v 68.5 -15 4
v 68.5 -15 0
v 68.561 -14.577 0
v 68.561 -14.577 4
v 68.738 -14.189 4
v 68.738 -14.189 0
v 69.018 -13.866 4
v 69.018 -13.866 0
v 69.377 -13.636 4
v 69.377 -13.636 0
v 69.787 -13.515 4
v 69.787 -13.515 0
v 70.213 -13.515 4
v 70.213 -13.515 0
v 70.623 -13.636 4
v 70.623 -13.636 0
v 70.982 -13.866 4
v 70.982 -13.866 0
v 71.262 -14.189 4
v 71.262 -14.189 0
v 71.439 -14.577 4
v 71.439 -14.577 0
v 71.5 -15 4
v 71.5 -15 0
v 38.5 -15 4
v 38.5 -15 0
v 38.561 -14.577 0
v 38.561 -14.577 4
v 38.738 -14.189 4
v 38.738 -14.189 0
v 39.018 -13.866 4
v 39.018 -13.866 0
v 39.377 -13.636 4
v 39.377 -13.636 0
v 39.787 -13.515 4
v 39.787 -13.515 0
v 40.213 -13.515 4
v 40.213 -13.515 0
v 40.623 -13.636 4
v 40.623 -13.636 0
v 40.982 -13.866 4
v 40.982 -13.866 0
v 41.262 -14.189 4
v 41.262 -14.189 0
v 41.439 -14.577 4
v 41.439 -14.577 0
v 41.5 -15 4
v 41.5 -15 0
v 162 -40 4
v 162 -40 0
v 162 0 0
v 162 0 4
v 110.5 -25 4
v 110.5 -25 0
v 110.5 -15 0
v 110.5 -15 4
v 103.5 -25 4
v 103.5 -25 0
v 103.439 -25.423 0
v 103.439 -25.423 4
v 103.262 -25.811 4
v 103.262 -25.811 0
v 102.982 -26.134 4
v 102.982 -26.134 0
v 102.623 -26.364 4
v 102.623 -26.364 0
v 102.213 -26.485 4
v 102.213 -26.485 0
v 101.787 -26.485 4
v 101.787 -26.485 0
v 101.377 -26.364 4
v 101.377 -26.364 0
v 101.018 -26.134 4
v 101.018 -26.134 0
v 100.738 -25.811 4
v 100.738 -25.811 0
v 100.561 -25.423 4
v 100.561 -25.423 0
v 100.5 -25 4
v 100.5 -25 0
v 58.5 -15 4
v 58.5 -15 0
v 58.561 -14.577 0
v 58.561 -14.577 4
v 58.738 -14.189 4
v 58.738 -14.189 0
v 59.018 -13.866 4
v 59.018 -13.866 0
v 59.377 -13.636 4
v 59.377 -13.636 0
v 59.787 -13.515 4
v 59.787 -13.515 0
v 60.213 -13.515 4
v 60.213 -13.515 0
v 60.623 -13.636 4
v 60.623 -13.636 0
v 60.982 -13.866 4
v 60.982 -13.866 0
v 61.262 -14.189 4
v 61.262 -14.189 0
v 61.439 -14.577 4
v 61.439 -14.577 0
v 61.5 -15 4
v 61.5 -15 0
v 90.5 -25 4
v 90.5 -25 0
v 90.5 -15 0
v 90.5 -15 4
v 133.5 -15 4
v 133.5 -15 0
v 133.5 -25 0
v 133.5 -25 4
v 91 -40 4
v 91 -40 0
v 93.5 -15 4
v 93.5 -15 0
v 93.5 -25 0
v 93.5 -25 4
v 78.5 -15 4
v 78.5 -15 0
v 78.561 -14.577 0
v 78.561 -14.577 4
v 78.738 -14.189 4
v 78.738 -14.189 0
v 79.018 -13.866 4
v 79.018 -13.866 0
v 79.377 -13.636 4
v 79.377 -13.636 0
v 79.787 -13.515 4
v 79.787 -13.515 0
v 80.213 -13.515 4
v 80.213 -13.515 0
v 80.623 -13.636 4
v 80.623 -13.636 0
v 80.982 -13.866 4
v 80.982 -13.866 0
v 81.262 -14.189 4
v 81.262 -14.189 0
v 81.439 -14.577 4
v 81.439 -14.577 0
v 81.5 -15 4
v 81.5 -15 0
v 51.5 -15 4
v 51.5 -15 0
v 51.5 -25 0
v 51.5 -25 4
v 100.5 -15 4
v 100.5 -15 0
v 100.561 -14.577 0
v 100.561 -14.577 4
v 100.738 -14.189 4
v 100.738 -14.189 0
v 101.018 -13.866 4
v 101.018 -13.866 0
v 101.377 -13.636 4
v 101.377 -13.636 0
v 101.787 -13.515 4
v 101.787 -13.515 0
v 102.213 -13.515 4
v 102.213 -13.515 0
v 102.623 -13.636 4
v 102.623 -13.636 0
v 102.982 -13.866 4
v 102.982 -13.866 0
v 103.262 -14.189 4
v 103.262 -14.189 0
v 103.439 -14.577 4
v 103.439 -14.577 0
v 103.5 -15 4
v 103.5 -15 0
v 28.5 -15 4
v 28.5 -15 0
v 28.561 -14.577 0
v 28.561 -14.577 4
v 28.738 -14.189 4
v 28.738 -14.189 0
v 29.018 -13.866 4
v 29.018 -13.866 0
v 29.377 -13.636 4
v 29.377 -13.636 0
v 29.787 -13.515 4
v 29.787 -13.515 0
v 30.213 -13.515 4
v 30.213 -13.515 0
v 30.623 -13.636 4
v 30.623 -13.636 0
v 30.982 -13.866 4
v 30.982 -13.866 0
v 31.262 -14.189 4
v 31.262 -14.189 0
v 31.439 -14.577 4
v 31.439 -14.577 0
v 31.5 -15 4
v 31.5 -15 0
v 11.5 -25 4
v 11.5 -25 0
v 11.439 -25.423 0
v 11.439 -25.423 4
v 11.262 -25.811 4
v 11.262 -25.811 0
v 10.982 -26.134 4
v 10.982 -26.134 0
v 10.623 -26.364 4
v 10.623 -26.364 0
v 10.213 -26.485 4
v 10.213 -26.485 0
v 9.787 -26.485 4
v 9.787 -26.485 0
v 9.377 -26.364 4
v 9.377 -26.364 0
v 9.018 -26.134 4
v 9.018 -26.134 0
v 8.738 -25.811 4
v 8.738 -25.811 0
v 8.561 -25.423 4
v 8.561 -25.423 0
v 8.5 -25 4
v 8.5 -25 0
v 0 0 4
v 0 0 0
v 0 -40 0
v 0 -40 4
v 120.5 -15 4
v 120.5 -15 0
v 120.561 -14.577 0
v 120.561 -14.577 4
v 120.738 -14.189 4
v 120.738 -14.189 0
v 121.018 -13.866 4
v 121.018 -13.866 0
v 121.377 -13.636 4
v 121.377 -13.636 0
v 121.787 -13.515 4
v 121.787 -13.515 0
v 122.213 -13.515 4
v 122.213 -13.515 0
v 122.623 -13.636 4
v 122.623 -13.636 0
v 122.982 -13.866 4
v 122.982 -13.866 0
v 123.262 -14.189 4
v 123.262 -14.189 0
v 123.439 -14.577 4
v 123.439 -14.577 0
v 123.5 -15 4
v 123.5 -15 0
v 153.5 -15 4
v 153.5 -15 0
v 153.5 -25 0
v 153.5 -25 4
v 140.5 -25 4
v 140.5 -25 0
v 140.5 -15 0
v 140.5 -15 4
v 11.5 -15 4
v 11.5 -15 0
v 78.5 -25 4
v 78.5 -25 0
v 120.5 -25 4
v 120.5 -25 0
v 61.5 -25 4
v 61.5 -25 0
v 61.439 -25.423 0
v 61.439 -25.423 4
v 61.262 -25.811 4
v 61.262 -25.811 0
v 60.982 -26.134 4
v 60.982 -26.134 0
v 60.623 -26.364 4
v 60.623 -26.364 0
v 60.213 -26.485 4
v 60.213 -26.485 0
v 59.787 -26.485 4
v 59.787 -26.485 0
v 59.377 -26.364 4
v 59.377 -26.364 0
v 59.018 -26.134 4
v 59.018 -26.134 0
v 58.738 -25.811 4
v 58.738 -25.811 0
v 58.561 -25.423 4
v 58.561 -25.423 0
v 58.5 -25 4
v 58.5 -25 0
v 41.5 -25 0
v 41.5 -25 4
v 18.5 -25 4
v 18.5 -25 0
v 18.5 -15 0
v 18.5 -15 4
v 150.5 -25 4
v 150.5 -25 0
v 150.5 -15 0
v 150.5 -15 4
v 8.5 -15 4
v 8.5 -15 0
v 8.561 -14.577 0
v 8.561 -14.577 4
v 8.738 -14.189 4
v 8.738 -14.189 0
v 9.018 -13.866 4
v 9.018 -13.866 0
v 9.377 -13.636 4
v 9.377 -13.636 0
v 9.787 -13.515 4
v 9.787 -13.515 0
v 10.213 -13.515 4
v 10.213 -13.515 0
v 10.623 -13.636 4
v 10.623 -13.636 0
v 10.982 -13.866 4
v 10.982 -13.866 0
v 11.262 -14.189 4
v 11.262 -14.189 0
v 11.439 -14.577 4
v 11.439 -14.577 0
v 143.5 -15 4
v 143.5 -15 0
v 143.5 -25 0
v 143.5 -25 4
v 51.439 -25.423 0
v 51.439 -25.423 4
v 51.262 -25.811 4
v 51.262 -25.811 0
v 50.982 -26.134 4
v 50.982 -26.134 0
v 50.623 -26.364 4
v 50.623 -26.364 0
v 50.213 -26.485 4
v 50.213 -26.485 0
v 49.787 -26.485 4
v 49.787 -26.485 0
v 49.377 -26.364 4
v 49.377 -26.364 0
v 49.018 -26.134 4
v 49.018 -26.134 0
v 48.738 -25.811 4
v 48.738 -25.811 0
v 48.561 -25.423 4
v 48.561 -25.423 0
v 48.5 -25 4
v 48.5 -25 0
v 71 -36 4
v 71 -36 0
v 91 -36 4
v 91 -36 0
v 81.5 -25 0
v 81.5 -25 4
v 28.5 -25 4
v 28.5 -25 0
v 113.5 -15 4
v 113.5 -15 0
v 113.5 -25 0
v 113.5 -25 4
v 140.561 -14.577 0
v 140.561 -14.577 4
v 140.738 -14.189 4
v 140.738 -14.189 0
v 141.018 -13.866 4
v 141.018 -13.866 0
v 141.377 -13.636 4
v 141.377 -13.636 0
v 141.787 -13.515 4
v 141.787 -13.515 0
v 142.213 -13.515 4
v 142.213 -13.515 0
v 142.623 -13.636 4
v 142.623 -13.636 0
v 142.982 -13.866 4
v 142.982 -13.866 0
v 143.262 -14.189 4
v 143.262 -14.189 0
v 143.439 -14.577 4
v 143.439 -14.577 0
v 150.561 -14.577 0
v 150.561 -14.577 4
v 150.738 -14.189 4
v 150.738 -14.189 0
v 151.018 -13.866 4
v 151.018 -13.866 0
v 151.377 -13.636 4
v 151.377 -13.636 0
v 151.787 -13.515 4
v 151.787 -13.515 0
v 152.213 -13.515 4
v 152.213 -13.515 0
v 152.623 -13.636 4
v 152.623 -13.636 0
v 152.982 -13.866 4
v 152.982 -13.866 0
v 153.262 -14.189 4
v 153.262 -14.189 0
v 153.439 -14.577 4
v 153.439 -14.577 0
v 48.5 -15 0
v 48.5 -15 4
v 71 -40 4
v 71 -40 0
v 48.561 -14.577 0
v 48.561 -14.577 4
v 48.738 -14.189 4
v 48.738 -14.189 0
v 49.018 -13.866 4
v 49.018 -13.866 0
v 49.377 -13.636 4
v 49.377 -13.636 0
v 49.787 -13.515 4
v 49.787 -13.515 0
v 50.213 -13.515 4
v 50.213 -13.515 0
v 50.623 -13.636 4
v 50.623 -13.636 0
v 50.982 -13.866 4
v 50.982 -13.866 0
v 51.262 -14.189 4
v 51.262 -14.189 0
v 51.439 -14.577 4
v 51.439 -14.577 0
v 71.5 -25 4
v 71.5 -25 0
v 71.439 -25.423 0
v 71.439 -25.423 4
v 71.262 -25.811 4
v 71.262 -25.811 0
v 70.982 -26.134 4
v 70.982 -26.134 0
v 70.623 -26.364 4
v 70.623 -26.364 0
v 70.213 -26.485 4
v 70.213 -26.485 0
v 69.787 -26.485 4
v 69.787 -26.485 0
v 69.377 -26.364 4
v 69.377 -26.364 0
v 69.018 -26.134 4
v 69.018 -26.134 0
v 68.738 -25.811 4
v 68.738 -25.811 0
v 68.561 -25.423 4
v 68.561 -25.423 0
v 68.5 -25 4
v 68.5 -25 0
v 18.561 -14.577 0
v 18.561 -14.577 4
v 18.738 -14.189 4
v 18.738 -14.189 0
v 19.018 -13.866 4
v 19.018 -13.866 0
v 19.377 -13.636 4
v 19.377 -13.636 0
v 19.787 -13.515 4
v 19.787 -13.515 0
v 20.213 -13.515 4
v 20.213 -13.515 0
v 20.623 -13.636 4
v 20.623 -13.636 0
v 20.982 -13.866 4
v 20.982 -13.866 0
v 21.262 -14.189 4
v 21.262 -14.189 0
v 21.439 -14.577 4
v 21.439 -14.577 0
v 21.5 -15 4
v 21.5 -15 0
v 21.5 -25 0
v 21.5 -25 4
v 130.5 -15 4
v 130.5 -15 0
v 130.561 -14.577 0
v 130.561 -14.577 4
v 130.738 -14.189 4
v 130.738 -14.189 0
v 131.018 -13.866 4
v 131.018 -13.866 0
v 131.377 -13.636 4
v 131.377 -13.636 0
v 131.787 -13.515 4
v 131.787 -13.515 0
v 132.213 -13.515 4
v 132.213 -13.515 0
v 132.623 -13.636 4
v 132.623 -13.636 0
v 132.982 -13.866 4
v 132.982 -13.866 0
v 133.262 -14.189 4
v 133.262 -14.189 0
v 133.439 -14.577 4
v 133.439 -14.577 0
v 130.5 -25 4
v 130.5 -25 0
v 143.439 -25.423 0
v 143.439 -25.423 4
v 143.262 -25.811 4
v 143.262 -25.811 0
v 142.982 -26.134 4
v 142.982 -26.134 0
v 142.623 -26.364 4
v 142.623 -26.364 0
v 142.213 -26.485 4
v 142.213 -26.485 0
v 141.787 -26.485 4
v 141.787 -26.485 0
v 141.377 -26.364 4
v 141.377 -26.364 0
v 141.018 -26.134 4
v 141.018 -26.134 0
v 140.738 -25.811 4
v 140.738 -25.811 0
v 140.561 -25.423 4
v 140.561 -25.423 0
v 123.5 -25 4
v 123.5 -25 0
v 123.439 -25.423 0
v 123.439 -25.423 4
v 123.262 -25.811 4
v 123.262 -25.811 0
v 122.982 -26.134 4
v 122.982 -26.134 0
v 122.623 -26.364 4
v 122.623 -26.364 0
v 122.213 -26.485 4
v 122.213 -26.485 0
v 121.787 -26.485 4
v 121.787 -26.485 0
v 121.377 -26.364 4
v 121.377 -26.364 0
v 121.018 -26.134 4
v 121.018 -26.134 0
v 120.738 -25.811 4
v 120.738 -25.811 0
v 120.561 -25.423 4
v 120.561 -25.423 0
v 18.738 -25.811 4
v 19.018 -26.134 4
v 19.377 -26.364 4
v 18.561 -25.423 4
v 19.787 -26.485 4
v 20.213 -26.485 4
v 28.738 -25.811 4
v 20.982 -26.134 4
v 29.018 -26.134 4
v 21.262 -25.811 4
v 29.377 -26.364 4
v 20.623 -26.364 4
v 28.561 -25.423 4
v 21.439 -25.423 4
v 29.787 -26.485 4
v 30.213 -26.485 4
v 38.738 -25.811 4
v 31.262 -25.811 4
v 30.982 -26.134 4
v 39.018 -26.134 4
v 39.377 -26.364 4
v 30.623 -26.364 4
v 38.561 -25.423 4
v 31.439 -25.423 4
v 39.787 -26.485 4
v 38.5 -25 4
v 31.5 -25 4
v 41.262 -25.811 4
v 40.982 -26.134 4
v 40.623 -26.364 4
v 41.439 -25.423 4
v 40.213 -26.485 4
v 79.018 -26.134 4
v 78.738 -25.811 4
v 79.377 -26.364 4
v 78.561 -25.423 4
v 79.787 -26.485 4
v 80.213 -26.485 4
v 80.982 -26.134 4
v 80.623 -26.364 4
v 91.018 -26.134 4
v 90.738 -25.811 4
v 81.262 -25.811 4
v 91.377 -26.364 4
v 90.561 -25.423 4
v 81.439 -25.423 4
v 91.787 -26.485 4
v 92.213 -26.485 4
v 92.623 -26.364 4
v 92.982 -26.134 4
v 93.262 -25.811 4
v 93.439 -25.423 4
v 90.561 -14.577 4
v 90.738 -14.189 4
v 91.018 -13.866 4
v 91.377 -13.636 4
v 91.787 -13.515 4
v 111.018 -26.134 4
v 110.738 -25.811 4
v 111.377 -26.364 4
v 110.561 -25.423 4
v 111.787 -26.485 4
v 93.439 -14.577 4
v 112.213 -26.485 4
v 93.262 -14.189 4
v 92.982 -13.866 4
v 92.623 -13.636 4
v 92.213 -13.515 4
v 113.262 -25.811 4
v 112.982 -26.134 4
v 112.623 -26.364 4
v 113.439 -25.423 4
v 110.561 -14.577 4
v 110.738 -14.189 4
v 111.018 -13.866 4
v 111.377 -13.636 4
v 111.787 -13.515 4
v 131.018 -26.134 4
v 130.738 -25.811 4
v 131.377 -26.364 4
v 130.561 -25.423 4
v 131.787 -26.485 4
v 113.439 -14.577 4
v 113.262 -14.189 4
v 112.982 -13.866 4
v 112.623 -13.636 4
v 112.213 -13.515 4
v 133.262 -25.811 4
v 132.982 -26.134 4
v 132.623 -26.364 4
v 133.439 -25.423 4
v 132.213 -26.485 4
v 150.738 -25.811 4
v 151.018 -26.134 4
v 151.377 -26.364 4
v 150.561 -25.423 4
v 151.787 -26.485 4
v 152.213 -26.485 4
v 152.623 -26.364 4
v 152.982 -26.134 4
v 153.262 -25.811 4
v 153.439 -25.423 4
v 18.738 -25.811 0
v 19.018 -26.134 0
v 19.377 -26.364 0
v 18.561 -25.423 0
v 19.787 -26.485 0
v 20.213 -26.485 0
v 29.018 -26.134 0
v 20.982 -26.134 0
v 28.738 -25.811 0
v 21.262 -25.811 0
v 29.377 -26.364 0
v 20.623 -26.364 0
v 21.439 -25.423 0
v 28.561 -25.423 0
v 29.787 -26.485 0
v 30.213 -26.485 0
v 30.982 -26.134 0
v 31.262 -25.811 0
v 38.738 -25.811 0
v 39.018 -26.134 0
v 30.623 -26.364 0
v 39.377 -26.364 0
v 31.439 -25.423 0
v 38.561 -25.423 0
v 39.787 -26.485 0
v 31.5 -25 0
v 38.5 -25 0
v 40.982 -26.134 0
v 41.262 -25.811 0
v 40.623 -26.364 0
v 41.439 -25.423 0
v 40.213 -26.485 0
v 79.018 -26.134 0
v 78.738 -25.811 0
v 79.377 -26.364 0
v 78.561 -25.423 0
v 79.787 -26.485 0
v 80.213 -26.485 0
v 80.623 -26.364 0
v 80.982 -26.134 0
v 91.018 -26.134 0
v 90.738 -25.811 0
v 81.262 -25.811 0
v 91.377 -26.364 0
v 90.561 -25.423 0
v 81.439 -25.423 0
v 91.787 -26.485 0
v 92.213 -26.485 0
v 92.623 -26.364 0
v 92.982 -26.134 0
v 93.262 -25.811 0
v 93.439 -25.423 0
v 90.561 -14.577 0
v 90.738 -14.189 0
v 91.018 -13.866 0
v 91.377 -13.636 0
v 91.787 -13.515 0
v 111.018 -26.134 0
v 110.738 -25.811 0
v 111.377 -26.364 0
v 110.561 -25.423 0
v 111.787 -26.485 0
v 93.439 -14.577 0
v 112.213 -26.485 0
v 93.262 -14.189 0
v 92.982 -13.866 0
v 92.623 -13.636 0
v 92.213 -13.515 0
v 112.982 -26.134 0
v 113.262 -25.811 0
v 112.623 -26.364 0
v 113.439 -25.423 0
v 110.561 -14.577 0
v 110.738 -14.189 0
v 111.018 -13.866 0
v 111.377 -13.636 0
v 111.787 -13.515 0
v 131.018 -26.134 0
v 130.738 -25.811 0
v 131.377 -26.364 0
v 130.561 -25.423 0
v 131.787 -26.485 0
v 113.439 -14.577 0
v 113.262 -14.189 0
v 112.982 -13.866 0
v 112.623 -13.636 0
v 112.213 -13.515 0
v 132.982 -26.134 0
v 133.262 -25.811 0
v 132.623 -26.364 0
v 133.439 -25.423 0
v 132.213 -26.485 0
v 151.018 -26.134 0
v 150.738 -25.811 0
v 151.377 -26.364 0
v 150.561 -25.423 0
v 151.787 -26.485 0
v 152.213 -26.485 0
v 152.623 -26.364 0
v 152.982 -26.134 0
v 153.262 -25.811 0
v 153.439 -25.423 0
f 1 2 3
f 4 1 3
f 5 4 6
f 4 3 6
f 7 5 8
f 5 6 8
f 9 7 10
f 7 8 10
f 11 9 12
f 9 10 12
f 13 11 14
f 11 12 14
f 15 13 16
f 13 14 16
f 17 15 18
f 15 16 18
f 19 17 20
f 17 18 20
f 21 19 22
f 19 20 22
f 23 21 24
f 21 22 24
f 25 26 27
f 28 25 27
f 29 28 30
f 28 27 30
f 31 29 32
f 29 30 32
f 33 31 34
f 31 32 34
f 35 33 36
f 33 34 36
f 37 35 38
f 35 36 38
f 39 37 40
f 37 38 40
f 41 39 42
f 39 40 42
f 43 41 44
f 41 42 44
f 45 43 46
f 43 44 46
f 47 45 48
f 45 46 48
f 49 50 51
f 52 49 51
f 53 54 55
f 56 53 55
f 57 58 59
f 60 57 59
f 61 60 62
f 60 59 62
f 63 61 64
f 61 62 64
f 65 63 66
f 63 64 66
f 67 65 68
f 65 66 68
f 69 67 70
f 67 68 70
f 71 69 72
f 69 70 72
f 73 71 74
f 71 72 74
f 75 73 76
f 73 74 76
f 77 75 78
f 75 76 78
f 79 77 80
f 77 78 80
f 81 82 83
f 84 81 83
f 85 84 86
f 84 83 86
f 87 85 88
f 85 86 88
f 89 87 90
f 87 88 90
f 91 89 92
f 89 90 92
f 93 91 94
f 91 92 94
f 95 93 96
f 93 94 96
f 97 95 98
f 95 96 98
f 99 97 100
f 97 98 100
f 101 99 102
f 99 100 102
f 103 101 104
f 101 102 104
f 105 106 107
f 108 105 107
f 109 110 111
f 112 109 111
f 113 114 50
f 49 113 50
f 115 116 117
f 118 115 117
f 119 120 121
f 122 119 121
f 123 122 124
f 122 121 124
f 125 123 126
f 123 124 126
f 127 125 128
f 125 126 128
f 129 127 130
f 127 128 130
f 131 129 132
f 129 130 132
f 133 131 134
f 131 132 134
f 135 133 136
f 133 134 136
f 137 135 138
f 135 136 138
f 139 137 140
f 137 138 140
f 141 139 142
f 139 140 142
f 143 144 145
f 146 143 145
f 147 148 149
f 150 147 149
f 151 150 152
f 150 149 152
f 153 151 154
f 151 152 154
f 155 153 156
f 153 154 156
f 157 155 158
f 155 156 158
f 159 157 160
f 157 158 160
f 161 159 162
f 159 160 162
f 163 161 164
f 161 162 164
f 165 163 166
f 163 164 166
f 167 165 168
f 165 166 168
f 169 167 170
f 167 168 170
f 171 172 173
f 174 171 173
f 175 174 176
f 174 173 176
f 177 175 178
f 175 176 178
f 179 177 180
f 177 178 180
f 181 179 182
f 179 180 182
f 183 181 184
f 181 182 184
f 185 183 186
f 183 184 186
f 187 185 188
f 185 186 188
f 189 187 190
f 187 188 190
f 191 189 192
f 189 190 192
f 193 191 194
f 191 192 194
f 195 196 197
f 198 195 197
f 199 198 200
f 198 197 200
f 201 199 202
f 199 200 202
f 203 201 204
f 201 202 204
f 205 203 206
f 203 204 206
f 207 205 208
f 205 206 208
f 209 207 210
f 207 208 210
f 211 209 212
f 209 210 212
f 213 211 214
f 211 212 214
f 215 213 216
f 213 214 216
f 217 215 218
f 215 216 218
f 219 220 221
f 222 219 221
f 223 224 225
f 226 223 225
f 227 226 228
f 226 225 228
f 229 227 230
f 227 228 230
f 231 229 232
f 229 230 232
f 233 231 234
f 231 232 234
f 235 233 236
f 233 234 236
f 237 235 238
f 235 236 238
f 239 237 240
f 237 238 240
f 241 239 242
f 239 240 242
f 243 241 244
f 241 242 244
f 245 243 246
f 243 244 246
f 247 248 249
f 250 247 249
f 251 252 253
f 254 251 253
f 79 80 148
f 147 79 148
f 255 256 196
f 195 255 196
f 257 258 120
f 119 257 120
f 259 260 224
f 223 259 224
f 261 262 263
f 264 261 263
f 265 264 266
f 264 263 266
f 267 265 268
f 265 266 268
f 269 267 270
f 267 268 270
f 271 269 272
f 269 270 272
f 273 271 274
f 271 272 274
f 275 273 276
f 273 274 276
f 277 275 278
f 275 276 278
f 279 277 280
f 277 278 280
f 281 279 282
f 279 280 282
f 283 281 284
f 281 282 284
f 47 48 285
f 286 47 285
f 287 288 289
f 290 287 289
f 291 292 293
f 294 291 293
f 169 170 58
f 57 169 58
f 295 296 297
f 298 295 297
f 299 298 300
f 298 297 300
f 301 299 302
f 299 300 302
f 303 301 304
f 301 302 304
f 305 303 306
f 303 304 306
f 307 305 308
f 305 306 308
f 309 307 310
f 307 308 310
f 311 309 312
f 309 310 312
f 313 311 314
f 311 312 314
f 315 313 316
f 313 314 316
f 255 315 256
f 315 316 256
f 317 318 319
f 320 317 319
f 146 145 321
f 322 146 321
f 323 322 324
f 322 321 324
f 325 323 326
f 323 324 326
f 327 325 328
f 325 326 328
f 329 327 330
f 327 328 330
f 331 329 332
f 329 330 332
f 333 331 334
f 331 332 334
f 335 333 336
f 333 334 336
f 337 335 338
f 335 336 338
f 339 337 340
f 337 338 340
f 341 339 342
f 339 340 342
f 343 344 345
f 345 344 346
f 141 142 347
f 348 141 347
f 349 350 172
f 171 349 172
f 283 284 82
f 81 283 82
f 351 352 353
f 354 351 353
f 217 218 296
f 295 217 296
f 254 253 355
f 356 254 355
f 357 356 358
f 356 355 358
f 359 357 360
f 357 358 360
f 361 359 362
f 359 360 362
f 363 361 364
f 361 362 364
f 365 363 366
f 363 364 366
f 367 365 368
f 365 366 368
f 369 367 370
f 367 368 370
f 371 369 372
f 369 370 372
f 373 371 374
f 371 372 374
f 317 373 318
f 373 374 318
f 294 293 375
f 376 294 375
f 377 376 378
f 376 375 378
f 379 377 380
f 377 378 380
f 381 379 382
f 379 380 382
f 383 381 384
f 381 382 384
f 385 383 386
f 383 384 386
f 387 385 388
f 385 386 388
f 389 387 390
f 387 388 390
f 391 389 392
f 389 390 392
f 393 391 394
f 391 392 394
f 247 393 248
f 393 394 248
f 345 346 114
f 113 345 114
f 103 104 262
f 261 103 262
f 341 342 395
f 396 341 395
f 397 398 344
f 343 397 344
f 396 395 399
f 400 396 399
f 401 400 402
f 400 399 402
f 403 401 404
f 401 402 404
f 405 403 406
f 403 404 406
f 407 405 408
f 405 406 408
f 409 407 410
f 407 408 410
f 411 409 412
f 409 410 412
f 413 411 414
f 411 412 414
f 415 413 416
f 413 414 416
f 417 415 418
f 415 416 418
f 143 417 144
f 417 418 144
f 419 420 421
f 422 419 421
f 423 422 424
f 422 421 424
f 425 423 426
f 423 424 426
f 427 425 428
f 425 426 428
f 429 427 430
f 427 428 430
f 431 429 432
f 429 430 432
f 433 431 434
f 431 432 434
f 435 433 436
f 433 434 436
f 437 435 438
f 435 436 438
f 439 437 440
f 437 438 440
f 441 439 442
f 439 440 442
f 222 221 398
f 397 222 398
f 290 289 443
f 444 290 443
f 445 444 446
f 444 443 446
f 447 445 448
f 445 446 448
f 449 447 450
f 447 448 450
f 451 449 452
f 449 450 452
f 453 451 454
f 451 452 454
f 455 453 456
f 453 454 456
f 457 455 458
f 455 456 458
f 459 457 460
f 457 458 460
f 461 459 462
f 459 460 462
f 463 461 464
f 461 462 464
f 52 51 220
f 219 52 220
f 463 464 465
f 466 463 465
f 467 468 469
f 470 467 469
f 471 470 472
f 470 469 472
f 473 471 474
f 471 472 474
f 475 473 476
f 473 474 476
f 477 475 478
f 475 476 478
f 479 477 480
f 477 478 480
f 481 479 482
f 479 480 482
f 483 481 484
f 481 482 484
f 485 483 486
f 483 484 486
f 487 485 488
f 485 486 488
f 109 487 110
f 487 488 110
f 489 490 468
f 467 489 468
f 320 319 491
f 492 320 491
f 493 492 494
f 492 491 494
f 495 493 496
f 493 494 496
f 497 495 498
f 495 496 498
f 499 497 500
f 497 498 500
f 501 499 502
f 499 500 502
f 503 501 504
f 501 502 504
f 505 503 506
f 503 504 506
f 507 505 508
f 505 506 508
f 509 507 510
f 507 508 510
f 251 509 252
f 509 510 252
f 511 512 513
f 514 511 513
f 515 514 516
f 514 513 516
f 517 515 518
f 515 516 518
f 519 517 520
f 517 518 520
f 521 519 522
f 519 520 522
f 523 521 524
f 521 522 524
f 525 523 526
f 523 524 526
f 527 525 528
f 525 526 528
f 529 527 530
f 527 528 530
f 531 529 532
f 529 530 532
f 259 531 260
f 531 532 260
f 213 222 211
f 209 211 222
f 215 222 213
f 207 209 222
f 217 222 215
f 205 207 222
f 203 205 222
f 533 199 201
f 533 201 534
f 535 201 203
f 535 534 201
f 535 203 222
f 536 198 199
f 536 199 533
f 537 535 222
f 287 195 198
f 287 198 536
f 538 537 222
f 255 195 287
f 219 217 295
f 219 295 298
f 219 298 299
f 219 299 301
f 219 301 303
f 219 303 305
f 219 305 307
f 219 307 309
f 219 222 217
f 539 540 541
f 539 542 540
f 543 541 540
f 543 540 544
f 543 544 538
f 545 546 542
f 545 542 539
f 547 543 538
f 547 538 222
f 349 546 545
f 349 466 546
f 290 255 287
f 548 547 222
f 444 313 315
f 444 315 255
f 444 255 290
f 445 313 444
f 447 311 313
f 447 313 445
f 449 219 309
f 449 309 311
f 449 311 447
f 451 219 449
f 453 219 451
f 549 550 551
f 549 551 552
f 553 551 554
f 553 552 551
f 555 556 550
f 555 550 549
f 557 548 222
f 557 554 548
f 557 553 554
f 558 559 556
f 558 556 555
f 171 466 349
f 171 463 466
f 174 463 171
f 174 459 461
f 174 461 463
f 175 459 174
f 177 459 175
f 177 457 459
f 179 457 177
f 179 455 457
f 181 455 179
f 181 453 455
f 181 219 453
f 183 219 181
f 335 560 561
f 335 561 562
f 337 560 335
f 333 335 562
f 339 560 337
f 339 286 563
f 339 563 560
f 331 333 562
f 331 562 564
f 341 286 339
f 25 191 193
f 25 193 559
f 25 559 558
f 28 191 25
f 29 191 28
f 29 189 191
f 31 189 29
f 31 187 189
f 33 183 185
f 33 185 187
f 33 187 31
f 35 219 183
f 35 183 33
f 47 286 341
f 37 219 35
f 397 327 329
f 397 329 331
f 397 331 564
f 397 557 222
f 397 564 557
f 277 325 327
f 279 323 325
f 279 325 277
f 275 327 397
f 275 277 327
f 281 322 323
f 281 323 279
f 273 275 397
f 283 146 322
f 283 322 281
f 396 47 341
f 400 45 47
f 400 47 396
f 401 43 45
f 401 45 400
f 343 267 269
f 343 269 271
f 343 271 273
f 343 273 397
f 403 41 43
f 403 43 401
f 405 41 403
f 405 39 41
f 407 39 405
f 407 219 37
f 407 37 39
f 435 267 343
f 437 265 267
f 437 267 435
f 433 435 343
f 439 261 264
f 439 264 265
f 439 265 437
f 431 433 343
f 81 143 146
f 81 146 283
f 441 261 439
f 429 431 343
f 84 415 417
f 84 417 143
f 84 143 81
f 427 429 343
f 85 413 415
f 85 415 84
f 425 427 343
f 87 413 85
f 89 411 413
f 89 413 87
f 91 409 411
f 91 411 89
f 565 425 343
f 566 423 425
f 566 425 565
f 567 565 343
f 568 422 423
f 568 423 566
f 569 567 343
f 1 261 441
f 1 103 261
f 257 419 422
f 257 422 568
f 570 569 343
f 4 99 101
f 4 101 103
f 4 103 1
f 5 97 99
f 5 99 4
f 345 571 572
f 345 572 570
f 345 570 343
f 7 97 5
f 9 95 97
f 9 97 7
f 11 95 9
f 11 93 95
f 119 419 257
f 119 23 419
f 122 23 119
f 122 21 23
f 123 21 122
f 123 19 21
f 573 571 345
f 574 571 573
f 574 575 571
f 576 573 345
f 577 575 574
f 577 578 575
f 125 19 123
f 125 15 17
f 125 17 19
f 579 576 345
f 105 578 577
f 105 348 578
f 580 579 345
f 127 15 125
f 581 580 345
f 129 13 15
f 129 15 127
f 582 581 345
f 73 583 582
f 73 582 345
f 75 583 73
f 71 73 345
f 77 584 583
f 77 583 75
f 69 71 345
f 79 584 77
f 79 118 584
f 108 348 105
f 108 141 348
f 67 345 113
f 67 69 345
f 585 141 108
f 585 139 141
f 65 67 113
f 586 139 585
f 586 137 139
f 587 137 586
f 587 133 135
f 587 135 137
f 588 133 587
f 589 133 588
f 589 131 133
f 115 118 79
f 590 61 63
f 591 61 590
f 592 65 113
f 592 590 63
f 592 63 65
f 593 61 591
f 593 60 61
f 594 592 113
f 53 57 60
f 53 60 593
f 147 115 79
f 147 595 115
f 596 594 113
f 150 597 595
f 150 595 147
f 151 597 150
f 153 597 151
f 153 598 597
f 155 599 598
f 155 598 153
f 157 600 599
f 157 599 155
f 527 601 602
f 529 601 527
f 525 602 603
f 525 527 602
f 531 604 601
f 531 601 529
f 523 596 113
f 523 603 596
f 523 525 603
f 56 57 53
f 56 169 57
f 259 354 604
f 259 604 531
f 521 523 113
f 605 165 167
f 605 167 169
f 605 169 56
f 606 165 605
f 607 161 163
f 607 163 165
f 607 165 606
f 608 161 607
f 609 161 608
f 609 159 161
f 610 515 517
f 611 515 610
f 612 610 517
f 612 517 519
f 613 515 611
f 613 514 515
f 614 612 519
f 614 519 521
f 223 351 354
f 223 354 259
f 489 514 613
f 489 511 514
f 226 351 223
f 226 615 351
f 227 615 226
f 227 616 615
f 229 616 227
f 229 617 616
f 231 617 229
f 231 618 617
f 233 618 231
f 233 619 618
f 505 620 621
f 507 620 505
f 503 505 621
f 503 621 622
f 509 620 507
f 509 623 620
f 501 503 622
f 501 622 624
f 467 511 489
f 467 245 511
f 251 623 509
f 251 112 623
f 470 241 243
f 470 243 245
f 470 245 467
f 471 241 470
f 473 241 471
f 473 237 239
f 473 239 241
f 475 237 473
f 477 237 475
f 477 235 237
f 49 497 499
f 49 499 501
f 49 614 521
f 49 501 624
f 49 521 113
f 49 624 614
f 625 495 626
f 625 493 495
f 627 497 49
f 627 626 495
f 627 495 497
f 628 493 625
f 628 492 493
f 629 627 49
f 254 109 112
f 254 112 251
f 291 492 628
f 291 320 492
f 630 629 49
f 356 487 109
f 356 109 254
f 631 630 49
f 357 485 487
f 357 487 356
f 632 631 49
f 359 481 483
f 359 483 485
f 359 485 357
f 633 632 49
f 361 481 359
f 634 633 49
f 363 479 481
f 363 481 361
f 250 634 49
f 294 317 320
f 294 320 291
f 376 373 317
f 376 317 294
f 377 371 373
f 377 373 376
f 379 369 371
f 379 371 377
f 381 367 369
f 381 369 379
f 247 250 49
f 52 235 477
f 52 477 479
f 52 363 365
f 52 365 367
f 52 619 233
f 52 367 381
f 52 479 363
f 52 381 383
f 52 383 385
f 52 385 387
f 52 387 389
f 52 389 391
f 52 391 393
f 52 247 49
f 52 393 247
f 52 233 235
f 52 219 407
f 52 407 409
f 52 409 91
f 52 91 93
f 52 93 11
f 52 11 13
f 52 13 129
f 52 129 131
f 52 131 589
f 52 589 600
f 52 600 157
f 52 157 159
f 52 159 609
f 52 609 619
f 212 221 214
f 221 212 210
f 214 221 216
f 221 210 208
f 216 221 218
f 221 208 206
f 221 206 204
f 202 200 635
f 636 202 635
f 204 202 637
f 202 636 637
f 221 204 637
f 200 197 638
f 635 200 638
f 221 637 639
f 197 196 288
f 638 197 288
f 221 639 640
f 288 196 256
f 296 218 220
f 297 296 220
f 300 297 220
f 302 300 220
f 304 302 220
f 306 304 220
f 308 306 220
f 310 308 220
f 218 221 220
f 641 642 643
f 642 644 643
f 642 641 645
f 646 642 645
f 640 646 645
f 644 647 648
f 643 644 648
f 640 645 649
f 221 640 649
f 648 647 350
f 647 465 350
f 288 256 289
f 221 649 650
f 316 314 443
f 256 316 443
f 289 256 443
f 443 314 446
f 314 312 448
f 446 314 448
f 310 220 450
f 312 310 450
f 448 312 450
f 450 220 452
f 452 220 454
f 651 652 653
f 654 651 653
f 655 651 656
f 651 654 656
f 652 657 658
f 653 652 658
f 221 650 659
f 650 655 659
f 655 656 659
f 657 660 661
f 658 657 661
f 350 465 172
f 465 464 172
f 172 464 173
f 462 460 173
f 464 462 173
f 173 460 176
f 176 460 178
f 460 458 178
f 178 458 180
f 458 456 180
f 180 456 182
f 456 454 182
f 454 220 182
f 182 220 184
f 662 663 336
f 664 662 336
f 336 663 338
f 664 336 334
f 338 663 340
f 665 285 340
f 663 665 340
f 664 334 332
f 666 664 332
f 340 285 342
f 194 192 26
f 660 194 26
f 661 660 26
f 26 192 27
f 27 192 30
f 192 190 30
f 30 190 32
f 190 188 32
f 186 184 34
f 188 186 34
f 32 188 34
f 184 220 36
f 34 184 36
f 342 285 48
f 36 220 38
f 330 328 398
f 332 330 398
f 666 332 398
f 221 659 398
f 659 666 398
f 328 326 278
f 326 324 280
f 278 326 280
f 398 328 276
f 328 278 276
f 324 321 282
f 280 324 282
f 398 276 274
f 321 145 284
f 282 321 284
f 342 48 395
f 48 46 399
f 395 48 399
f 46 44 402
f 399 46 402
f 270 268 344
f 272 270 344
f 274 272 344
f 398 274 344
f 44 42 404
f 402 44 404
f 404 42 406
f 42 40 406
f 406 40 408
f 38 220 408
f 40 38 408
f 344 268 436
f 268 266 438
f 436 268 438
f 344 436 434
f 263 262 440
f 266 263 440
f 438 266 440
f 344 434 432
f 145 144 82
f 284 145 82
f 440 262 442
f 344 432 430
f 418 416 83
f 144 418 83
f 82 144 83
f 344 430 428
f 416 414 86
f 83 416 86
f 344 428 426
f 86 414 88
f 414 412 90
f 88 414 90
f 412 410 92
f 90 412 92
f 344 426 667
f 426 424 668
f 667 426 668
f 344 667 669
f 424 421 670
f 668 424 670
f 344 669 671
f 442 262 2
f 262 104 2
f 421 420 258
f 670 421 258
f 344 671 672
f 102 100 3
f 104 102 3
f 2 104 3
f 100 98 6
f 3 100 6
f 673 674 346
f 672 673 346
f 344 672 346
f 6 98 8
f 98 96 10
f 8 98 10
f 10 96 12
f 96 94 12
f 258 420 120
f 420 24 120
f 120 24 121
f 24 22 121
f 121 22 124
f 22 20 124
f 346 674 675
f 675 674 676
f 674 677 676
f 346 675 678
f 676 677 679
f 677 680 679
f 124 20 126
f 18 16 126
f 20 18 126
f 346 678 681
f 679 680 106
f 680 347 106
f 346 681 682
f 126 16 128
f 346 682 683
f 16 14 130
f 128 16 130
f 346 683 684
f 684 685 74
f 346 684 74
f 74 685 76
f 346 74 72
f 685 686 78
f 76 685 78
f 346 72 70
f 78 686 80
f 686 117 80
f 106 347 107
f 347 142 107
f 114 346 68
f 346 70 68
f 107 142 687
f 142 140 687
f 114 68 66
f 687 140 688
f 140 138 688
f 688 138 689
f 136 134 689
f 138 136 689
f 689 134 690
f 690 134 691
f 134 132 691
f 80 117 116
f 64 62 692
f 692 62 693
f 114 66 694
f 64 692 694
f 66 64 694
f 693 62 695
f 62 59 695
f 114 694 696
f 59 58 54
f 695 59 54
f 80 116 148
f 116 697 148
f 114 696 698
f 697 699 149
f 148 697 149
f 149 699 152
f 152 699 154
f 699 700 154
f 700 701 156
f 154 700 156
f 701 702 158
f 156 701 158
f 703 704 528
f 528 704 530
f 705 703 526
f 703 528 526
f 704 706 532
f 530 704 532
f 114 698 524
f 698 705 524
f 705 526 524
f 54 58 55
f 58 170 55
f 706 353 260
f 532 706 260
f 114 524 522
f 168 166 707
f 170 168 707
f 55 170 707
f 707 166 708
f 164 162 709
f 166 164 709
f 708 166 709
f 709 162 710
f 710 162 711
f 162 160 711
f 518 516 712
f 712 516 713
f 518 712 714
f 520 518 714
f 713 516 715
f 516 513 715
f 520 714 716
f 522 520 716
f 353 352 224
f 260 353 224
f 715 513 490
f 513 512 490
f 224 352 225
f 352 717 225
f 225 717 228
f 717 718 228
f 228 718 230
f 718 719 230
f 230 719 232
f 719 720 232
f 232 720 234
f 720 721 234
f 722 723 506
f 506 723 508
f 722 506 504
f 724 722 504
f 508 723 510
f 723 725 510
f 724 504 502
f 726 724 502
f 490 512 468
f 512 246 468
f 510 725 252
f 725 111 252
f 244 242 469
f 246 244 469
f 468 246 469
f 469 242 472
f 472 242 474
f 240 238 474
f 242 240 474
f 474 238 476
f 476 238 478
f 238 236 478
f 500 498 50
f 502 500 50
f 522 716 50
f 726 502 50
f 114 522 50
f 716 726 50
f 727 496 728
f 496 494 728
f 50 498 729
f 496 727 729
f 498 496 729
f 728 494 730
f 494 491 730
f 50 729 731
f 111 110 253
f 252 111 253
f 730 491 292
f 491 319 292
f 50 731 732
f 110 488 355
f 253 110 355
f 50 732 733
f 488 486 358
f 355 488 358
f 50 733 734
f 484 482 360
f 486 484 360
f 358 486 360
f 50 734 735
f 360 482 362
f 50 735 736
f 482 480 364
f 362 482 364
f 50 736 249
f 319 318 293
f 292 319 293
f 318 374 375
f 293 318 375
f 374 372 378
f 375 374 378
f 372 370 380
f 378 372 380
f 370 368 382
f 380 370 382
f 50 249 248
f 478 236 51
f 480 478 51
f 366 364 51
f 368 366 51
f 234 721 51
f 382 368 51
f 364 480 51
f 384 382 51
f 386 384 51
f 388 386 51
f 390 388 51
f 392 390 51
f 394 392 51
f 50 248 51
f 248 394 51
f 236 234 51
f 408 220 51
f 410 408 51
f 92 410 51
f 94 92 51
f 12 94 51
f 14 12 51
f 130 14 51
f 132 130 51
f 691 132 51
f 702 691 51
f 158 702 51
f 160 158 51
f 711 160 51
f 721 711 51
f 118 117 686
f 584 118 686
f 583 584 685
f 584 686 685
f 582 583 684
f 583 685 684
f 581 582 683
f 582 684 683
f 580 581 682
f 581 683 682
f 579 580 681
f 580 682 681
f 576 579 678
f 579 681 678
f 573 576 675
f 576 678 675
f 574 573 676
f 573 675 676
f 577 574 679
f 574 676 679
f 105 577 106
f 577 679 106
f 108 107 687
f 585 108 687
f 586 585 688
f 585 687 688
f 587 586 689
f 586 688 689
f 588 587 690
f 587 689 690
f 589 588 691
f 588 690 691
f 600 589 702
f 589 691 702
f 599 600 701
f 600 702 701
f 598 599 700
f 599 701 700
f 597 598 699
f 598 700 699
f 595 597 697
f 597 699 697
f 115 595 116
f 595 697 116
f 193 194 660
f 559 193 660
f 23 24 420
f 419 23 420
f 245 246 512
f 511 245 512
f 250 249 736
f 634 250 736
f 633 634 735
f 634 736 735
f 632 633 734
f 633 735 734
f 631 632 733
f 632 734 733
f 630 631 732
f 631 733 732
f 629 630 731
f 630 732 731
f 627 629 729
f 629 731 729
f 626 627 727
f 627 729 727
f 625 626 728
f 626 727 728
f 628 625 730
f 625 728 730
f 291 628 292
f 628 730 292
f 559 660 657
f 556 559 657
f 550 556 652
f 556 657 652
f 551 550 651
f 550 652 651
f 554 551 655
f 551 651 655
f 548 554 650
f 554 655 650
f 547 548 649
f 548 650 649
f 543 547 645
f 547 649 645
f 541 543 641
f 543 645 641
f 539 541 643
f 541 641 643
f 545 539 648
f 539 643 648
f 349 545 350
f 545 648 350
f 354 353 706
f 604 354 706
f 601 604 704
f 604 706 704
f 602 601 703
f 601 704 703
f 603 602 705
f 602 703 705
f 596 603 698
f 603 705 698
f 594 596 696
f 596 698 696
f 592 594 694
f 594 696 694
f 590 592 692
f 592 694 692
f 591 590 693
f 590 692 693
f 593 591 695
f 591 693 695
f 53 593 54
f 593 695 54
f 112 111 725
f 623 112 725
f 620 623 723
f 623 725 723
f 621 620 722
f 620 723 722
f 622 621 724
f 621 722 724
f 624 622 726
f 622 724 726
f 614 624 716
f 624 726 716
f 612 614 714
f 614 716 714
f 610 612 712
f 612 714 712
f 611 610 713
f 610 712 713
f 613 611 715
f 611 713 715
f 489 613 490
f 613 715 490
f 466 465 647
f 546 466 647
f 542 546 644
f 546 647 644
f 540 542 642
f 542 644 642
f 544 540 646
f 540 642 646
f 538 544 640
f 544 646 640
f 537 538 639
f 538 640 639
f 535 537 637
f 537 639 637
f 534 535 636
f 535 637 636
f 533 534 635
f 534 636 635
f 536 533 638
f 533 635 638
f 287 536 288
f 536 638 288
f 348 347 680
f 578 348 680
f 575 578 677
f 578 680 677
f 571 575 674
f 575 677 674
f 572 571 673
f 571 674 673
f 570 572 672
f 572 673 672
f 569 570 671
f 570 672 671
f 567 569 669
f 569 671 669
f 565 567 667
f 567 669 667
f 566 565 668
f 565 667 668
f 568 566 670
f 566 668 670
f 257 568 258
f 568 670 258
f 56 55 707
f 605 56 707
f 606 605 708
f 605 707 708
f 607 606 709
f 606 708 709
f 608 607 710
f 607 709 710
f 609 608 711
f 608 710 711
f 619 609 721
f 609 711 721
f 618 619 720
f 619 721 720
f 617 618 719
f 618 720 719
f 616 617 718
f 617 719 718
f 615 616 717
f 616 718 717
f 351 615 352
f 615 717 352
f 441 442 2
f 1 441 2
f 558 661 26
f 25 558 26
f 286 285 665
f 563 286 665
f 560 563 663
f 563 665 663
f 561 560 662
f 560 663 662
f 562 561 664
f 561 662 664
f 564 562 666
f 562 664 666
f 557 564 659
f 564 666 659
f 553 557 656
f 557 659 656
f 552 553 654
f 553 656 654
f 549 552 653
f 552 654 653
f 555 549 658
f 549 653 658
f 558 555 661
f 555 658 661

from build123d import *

# Parameters (mm, degrees)
BOSS_EXTRUDE1_DEPTH = 4


with BuildPart() as part:
    # Sketch1 → Boss-Extrude1 (new body)
    with BuildSketch(Plane.XY):
        Polygon((162, 0), (0, 0), (0, -40), (71, -40), (71, -36), (91, -36), (91, -40), (162, -40), align=None)
        with BuildLine():
            ThreePointArc((8.5, -15), (10, -13.5), (11.5, -15))
            Line((11.5, -15), (11.5, -25))
            ThreePointArc((11.5, -25), (10, -26.5), (8.5, -25))
            Line((8.5, -25), (8.5, -15))
        make_face(mode=Mode.SUBTRACT)
        with BuildLine():
            Line((18.5, -25), (18.5, -15))
            ThreePointArc((18.5, -15), (20, -13.5), (21.5, -15))
            Line((21.5, -15), (21.5, -25))
            ThreePointArc((21.5, -25), (20, -26.5), (18.5, -25))
        make_face(mode=Mode.SUBTRACT)
        with BuildLine():
            ThreePointArc((28.5, -15), (30, -13.5), (31.5, -15))
            Line((31.5, -15), (31.5, -25))
            ThreePointArc((31.5, -25), (30, -26.5), (28.5, -25))
            Line((28.5, -25), (28.5, -15))
        make_face(mode=Mode.SUBTRACT)
        with BuildLine():
            Line((38.5, -25), (38.5, -15))
            ThreePointArc((38.5, -15), (40, -13.5), (41.5, -15))
            Line((41.5, -15), (41.5, -25))
            ThreePointArc((41.5, -25), (40, -26.5), (38.5, -25))
        make_face(mode=Mode.SUBTRACT)
        with BuildLine():
            ThreePointArc((68.5, -15), (70, -13.5), (71.5, -15))
            Line((71.5, -15), (71.5, -25))
            ThreePointArc((71.5, -25), (70, -26.5), (68.5, -25))
            Line((68.5, -25), (68.5, -15))
        make_face(mode=Mode.SUBTRACT)
        with BuildLine():
            Line((78.5, -25), (78.5, -15))
            ThreePointArc((78.5, -15), (80, -13.5), (81.5, -15))
            Line((81.5, -15), (81.5, -25))
            ThreePointArc((81.5, -25), (80, -26.5), (78.5, -25))
        make_face(mode=Mode.SUBTRACT)
        with BuildLine():
            Line((90.5, -25), (90.5, -15))
            ThreePointArc((90.5, -15), (92, -13.5), (93.5, -15))
            Line((93.5, -15), (93.5, -25))
            ThreePointArc((93.5, -25), (92, -26.5), (90.5, -25))
        make_face(mode=Mode.SUBTRACT)
        with BuildLine():
            ThreePointArc((100.5, -15), (102, -13.5), (103.5, -15))
            Line((103.5, -15), (103.5, -25))
            ThreePointArc((103.5, -25), (102, -26.5), (100.5, -25))
            Line((100.5, -25), (100.5, -15))
        make_face(mode=Mode.SUBTRACT)
        with BuildLine():
            ThreePointArc((120.5, -15), (122, -13.5), (123.5, -15))
            Line((123.5, -15), (123.5, -25))
            ThreePointArc((123.5, -25), (122, -26.5), (120.5, -25))
            Line((120.5, -25), (120.5, -15))
        make_face(mode=Mode.SUBTRACT)
        with BuildLine():
            Line((130.5, -25), (130.5, -15))
            ThreePointArc((130.5, -15), (132, -13.5), (133.5, -15))
            Line((133.5, -15), (133.5, -25))
            ThreePointArc((133.5, -25), (132, -26.5), (130.5, -25))
        make_face(mode=Mode.SUBTRACT)
        with BuildLine():
            ThreePointArc((140.5, -15), (142, -13.5), (143.5, -15))
            Line((143.5, -15), (143.5, -25))
            ThreePointArc((143.5, -25), (142, -26.5), (140.5, -25))
            Line((140.5, -25), (140.5, -15))
        make_face(mode=Mode.SUBTRACT)
        with BuildLine():
            Line((150.5, -25), (150.5, -15))
            ThreePointArc((150.5, -15), (152, -13.5), (153.5, -15))
            Line((153.5, -15), (153.5, -25))
            ThreePointArc((153.5, -25), (152, -26.5), (150.5, -25))
        make_face(mode=Mode.SUBTRACT)
        with BuildLine():
            ThreePointArc((48.5, -15), (50, -13.5), (51.5, -15))
            Line((51.5, -15), (51.5, -25))
            ThreePointArc((51.5, -25), (50, -26.5), (48.5, -25))
            Line((48.5, -25), (48.5, -15))
        make_face(mode=Mode.SUBTRACT)
        with BuildLine():
            Line((58.5, -25), (58.5, -15))
            ThreePointArc((58.5, -15), (60, -13.5), (61.5, -15))
            Line((61.5, -15), (61.5, -25))
            ThreePointArc((61.5, -25), (60, -26.5), (58.5, -25))
        make_face(mode=Mode.SUBTRACT)
        with BuildLine():
            Line((110.5, -25), (110.5, -15))
            ThreePointArc((110.5, -15), (112, -13.5), (113.5, -15))
            Line((113.5, -15), (113.5, -25))
            ThreePointArc((113.5, -25), (112, -26.5), (110.5, -25))
        make_face(mode=Mode.SUBTRACT)
    extrude(amount=BOSS_EXTRUDE1_DEPTH)


solid = part.part
